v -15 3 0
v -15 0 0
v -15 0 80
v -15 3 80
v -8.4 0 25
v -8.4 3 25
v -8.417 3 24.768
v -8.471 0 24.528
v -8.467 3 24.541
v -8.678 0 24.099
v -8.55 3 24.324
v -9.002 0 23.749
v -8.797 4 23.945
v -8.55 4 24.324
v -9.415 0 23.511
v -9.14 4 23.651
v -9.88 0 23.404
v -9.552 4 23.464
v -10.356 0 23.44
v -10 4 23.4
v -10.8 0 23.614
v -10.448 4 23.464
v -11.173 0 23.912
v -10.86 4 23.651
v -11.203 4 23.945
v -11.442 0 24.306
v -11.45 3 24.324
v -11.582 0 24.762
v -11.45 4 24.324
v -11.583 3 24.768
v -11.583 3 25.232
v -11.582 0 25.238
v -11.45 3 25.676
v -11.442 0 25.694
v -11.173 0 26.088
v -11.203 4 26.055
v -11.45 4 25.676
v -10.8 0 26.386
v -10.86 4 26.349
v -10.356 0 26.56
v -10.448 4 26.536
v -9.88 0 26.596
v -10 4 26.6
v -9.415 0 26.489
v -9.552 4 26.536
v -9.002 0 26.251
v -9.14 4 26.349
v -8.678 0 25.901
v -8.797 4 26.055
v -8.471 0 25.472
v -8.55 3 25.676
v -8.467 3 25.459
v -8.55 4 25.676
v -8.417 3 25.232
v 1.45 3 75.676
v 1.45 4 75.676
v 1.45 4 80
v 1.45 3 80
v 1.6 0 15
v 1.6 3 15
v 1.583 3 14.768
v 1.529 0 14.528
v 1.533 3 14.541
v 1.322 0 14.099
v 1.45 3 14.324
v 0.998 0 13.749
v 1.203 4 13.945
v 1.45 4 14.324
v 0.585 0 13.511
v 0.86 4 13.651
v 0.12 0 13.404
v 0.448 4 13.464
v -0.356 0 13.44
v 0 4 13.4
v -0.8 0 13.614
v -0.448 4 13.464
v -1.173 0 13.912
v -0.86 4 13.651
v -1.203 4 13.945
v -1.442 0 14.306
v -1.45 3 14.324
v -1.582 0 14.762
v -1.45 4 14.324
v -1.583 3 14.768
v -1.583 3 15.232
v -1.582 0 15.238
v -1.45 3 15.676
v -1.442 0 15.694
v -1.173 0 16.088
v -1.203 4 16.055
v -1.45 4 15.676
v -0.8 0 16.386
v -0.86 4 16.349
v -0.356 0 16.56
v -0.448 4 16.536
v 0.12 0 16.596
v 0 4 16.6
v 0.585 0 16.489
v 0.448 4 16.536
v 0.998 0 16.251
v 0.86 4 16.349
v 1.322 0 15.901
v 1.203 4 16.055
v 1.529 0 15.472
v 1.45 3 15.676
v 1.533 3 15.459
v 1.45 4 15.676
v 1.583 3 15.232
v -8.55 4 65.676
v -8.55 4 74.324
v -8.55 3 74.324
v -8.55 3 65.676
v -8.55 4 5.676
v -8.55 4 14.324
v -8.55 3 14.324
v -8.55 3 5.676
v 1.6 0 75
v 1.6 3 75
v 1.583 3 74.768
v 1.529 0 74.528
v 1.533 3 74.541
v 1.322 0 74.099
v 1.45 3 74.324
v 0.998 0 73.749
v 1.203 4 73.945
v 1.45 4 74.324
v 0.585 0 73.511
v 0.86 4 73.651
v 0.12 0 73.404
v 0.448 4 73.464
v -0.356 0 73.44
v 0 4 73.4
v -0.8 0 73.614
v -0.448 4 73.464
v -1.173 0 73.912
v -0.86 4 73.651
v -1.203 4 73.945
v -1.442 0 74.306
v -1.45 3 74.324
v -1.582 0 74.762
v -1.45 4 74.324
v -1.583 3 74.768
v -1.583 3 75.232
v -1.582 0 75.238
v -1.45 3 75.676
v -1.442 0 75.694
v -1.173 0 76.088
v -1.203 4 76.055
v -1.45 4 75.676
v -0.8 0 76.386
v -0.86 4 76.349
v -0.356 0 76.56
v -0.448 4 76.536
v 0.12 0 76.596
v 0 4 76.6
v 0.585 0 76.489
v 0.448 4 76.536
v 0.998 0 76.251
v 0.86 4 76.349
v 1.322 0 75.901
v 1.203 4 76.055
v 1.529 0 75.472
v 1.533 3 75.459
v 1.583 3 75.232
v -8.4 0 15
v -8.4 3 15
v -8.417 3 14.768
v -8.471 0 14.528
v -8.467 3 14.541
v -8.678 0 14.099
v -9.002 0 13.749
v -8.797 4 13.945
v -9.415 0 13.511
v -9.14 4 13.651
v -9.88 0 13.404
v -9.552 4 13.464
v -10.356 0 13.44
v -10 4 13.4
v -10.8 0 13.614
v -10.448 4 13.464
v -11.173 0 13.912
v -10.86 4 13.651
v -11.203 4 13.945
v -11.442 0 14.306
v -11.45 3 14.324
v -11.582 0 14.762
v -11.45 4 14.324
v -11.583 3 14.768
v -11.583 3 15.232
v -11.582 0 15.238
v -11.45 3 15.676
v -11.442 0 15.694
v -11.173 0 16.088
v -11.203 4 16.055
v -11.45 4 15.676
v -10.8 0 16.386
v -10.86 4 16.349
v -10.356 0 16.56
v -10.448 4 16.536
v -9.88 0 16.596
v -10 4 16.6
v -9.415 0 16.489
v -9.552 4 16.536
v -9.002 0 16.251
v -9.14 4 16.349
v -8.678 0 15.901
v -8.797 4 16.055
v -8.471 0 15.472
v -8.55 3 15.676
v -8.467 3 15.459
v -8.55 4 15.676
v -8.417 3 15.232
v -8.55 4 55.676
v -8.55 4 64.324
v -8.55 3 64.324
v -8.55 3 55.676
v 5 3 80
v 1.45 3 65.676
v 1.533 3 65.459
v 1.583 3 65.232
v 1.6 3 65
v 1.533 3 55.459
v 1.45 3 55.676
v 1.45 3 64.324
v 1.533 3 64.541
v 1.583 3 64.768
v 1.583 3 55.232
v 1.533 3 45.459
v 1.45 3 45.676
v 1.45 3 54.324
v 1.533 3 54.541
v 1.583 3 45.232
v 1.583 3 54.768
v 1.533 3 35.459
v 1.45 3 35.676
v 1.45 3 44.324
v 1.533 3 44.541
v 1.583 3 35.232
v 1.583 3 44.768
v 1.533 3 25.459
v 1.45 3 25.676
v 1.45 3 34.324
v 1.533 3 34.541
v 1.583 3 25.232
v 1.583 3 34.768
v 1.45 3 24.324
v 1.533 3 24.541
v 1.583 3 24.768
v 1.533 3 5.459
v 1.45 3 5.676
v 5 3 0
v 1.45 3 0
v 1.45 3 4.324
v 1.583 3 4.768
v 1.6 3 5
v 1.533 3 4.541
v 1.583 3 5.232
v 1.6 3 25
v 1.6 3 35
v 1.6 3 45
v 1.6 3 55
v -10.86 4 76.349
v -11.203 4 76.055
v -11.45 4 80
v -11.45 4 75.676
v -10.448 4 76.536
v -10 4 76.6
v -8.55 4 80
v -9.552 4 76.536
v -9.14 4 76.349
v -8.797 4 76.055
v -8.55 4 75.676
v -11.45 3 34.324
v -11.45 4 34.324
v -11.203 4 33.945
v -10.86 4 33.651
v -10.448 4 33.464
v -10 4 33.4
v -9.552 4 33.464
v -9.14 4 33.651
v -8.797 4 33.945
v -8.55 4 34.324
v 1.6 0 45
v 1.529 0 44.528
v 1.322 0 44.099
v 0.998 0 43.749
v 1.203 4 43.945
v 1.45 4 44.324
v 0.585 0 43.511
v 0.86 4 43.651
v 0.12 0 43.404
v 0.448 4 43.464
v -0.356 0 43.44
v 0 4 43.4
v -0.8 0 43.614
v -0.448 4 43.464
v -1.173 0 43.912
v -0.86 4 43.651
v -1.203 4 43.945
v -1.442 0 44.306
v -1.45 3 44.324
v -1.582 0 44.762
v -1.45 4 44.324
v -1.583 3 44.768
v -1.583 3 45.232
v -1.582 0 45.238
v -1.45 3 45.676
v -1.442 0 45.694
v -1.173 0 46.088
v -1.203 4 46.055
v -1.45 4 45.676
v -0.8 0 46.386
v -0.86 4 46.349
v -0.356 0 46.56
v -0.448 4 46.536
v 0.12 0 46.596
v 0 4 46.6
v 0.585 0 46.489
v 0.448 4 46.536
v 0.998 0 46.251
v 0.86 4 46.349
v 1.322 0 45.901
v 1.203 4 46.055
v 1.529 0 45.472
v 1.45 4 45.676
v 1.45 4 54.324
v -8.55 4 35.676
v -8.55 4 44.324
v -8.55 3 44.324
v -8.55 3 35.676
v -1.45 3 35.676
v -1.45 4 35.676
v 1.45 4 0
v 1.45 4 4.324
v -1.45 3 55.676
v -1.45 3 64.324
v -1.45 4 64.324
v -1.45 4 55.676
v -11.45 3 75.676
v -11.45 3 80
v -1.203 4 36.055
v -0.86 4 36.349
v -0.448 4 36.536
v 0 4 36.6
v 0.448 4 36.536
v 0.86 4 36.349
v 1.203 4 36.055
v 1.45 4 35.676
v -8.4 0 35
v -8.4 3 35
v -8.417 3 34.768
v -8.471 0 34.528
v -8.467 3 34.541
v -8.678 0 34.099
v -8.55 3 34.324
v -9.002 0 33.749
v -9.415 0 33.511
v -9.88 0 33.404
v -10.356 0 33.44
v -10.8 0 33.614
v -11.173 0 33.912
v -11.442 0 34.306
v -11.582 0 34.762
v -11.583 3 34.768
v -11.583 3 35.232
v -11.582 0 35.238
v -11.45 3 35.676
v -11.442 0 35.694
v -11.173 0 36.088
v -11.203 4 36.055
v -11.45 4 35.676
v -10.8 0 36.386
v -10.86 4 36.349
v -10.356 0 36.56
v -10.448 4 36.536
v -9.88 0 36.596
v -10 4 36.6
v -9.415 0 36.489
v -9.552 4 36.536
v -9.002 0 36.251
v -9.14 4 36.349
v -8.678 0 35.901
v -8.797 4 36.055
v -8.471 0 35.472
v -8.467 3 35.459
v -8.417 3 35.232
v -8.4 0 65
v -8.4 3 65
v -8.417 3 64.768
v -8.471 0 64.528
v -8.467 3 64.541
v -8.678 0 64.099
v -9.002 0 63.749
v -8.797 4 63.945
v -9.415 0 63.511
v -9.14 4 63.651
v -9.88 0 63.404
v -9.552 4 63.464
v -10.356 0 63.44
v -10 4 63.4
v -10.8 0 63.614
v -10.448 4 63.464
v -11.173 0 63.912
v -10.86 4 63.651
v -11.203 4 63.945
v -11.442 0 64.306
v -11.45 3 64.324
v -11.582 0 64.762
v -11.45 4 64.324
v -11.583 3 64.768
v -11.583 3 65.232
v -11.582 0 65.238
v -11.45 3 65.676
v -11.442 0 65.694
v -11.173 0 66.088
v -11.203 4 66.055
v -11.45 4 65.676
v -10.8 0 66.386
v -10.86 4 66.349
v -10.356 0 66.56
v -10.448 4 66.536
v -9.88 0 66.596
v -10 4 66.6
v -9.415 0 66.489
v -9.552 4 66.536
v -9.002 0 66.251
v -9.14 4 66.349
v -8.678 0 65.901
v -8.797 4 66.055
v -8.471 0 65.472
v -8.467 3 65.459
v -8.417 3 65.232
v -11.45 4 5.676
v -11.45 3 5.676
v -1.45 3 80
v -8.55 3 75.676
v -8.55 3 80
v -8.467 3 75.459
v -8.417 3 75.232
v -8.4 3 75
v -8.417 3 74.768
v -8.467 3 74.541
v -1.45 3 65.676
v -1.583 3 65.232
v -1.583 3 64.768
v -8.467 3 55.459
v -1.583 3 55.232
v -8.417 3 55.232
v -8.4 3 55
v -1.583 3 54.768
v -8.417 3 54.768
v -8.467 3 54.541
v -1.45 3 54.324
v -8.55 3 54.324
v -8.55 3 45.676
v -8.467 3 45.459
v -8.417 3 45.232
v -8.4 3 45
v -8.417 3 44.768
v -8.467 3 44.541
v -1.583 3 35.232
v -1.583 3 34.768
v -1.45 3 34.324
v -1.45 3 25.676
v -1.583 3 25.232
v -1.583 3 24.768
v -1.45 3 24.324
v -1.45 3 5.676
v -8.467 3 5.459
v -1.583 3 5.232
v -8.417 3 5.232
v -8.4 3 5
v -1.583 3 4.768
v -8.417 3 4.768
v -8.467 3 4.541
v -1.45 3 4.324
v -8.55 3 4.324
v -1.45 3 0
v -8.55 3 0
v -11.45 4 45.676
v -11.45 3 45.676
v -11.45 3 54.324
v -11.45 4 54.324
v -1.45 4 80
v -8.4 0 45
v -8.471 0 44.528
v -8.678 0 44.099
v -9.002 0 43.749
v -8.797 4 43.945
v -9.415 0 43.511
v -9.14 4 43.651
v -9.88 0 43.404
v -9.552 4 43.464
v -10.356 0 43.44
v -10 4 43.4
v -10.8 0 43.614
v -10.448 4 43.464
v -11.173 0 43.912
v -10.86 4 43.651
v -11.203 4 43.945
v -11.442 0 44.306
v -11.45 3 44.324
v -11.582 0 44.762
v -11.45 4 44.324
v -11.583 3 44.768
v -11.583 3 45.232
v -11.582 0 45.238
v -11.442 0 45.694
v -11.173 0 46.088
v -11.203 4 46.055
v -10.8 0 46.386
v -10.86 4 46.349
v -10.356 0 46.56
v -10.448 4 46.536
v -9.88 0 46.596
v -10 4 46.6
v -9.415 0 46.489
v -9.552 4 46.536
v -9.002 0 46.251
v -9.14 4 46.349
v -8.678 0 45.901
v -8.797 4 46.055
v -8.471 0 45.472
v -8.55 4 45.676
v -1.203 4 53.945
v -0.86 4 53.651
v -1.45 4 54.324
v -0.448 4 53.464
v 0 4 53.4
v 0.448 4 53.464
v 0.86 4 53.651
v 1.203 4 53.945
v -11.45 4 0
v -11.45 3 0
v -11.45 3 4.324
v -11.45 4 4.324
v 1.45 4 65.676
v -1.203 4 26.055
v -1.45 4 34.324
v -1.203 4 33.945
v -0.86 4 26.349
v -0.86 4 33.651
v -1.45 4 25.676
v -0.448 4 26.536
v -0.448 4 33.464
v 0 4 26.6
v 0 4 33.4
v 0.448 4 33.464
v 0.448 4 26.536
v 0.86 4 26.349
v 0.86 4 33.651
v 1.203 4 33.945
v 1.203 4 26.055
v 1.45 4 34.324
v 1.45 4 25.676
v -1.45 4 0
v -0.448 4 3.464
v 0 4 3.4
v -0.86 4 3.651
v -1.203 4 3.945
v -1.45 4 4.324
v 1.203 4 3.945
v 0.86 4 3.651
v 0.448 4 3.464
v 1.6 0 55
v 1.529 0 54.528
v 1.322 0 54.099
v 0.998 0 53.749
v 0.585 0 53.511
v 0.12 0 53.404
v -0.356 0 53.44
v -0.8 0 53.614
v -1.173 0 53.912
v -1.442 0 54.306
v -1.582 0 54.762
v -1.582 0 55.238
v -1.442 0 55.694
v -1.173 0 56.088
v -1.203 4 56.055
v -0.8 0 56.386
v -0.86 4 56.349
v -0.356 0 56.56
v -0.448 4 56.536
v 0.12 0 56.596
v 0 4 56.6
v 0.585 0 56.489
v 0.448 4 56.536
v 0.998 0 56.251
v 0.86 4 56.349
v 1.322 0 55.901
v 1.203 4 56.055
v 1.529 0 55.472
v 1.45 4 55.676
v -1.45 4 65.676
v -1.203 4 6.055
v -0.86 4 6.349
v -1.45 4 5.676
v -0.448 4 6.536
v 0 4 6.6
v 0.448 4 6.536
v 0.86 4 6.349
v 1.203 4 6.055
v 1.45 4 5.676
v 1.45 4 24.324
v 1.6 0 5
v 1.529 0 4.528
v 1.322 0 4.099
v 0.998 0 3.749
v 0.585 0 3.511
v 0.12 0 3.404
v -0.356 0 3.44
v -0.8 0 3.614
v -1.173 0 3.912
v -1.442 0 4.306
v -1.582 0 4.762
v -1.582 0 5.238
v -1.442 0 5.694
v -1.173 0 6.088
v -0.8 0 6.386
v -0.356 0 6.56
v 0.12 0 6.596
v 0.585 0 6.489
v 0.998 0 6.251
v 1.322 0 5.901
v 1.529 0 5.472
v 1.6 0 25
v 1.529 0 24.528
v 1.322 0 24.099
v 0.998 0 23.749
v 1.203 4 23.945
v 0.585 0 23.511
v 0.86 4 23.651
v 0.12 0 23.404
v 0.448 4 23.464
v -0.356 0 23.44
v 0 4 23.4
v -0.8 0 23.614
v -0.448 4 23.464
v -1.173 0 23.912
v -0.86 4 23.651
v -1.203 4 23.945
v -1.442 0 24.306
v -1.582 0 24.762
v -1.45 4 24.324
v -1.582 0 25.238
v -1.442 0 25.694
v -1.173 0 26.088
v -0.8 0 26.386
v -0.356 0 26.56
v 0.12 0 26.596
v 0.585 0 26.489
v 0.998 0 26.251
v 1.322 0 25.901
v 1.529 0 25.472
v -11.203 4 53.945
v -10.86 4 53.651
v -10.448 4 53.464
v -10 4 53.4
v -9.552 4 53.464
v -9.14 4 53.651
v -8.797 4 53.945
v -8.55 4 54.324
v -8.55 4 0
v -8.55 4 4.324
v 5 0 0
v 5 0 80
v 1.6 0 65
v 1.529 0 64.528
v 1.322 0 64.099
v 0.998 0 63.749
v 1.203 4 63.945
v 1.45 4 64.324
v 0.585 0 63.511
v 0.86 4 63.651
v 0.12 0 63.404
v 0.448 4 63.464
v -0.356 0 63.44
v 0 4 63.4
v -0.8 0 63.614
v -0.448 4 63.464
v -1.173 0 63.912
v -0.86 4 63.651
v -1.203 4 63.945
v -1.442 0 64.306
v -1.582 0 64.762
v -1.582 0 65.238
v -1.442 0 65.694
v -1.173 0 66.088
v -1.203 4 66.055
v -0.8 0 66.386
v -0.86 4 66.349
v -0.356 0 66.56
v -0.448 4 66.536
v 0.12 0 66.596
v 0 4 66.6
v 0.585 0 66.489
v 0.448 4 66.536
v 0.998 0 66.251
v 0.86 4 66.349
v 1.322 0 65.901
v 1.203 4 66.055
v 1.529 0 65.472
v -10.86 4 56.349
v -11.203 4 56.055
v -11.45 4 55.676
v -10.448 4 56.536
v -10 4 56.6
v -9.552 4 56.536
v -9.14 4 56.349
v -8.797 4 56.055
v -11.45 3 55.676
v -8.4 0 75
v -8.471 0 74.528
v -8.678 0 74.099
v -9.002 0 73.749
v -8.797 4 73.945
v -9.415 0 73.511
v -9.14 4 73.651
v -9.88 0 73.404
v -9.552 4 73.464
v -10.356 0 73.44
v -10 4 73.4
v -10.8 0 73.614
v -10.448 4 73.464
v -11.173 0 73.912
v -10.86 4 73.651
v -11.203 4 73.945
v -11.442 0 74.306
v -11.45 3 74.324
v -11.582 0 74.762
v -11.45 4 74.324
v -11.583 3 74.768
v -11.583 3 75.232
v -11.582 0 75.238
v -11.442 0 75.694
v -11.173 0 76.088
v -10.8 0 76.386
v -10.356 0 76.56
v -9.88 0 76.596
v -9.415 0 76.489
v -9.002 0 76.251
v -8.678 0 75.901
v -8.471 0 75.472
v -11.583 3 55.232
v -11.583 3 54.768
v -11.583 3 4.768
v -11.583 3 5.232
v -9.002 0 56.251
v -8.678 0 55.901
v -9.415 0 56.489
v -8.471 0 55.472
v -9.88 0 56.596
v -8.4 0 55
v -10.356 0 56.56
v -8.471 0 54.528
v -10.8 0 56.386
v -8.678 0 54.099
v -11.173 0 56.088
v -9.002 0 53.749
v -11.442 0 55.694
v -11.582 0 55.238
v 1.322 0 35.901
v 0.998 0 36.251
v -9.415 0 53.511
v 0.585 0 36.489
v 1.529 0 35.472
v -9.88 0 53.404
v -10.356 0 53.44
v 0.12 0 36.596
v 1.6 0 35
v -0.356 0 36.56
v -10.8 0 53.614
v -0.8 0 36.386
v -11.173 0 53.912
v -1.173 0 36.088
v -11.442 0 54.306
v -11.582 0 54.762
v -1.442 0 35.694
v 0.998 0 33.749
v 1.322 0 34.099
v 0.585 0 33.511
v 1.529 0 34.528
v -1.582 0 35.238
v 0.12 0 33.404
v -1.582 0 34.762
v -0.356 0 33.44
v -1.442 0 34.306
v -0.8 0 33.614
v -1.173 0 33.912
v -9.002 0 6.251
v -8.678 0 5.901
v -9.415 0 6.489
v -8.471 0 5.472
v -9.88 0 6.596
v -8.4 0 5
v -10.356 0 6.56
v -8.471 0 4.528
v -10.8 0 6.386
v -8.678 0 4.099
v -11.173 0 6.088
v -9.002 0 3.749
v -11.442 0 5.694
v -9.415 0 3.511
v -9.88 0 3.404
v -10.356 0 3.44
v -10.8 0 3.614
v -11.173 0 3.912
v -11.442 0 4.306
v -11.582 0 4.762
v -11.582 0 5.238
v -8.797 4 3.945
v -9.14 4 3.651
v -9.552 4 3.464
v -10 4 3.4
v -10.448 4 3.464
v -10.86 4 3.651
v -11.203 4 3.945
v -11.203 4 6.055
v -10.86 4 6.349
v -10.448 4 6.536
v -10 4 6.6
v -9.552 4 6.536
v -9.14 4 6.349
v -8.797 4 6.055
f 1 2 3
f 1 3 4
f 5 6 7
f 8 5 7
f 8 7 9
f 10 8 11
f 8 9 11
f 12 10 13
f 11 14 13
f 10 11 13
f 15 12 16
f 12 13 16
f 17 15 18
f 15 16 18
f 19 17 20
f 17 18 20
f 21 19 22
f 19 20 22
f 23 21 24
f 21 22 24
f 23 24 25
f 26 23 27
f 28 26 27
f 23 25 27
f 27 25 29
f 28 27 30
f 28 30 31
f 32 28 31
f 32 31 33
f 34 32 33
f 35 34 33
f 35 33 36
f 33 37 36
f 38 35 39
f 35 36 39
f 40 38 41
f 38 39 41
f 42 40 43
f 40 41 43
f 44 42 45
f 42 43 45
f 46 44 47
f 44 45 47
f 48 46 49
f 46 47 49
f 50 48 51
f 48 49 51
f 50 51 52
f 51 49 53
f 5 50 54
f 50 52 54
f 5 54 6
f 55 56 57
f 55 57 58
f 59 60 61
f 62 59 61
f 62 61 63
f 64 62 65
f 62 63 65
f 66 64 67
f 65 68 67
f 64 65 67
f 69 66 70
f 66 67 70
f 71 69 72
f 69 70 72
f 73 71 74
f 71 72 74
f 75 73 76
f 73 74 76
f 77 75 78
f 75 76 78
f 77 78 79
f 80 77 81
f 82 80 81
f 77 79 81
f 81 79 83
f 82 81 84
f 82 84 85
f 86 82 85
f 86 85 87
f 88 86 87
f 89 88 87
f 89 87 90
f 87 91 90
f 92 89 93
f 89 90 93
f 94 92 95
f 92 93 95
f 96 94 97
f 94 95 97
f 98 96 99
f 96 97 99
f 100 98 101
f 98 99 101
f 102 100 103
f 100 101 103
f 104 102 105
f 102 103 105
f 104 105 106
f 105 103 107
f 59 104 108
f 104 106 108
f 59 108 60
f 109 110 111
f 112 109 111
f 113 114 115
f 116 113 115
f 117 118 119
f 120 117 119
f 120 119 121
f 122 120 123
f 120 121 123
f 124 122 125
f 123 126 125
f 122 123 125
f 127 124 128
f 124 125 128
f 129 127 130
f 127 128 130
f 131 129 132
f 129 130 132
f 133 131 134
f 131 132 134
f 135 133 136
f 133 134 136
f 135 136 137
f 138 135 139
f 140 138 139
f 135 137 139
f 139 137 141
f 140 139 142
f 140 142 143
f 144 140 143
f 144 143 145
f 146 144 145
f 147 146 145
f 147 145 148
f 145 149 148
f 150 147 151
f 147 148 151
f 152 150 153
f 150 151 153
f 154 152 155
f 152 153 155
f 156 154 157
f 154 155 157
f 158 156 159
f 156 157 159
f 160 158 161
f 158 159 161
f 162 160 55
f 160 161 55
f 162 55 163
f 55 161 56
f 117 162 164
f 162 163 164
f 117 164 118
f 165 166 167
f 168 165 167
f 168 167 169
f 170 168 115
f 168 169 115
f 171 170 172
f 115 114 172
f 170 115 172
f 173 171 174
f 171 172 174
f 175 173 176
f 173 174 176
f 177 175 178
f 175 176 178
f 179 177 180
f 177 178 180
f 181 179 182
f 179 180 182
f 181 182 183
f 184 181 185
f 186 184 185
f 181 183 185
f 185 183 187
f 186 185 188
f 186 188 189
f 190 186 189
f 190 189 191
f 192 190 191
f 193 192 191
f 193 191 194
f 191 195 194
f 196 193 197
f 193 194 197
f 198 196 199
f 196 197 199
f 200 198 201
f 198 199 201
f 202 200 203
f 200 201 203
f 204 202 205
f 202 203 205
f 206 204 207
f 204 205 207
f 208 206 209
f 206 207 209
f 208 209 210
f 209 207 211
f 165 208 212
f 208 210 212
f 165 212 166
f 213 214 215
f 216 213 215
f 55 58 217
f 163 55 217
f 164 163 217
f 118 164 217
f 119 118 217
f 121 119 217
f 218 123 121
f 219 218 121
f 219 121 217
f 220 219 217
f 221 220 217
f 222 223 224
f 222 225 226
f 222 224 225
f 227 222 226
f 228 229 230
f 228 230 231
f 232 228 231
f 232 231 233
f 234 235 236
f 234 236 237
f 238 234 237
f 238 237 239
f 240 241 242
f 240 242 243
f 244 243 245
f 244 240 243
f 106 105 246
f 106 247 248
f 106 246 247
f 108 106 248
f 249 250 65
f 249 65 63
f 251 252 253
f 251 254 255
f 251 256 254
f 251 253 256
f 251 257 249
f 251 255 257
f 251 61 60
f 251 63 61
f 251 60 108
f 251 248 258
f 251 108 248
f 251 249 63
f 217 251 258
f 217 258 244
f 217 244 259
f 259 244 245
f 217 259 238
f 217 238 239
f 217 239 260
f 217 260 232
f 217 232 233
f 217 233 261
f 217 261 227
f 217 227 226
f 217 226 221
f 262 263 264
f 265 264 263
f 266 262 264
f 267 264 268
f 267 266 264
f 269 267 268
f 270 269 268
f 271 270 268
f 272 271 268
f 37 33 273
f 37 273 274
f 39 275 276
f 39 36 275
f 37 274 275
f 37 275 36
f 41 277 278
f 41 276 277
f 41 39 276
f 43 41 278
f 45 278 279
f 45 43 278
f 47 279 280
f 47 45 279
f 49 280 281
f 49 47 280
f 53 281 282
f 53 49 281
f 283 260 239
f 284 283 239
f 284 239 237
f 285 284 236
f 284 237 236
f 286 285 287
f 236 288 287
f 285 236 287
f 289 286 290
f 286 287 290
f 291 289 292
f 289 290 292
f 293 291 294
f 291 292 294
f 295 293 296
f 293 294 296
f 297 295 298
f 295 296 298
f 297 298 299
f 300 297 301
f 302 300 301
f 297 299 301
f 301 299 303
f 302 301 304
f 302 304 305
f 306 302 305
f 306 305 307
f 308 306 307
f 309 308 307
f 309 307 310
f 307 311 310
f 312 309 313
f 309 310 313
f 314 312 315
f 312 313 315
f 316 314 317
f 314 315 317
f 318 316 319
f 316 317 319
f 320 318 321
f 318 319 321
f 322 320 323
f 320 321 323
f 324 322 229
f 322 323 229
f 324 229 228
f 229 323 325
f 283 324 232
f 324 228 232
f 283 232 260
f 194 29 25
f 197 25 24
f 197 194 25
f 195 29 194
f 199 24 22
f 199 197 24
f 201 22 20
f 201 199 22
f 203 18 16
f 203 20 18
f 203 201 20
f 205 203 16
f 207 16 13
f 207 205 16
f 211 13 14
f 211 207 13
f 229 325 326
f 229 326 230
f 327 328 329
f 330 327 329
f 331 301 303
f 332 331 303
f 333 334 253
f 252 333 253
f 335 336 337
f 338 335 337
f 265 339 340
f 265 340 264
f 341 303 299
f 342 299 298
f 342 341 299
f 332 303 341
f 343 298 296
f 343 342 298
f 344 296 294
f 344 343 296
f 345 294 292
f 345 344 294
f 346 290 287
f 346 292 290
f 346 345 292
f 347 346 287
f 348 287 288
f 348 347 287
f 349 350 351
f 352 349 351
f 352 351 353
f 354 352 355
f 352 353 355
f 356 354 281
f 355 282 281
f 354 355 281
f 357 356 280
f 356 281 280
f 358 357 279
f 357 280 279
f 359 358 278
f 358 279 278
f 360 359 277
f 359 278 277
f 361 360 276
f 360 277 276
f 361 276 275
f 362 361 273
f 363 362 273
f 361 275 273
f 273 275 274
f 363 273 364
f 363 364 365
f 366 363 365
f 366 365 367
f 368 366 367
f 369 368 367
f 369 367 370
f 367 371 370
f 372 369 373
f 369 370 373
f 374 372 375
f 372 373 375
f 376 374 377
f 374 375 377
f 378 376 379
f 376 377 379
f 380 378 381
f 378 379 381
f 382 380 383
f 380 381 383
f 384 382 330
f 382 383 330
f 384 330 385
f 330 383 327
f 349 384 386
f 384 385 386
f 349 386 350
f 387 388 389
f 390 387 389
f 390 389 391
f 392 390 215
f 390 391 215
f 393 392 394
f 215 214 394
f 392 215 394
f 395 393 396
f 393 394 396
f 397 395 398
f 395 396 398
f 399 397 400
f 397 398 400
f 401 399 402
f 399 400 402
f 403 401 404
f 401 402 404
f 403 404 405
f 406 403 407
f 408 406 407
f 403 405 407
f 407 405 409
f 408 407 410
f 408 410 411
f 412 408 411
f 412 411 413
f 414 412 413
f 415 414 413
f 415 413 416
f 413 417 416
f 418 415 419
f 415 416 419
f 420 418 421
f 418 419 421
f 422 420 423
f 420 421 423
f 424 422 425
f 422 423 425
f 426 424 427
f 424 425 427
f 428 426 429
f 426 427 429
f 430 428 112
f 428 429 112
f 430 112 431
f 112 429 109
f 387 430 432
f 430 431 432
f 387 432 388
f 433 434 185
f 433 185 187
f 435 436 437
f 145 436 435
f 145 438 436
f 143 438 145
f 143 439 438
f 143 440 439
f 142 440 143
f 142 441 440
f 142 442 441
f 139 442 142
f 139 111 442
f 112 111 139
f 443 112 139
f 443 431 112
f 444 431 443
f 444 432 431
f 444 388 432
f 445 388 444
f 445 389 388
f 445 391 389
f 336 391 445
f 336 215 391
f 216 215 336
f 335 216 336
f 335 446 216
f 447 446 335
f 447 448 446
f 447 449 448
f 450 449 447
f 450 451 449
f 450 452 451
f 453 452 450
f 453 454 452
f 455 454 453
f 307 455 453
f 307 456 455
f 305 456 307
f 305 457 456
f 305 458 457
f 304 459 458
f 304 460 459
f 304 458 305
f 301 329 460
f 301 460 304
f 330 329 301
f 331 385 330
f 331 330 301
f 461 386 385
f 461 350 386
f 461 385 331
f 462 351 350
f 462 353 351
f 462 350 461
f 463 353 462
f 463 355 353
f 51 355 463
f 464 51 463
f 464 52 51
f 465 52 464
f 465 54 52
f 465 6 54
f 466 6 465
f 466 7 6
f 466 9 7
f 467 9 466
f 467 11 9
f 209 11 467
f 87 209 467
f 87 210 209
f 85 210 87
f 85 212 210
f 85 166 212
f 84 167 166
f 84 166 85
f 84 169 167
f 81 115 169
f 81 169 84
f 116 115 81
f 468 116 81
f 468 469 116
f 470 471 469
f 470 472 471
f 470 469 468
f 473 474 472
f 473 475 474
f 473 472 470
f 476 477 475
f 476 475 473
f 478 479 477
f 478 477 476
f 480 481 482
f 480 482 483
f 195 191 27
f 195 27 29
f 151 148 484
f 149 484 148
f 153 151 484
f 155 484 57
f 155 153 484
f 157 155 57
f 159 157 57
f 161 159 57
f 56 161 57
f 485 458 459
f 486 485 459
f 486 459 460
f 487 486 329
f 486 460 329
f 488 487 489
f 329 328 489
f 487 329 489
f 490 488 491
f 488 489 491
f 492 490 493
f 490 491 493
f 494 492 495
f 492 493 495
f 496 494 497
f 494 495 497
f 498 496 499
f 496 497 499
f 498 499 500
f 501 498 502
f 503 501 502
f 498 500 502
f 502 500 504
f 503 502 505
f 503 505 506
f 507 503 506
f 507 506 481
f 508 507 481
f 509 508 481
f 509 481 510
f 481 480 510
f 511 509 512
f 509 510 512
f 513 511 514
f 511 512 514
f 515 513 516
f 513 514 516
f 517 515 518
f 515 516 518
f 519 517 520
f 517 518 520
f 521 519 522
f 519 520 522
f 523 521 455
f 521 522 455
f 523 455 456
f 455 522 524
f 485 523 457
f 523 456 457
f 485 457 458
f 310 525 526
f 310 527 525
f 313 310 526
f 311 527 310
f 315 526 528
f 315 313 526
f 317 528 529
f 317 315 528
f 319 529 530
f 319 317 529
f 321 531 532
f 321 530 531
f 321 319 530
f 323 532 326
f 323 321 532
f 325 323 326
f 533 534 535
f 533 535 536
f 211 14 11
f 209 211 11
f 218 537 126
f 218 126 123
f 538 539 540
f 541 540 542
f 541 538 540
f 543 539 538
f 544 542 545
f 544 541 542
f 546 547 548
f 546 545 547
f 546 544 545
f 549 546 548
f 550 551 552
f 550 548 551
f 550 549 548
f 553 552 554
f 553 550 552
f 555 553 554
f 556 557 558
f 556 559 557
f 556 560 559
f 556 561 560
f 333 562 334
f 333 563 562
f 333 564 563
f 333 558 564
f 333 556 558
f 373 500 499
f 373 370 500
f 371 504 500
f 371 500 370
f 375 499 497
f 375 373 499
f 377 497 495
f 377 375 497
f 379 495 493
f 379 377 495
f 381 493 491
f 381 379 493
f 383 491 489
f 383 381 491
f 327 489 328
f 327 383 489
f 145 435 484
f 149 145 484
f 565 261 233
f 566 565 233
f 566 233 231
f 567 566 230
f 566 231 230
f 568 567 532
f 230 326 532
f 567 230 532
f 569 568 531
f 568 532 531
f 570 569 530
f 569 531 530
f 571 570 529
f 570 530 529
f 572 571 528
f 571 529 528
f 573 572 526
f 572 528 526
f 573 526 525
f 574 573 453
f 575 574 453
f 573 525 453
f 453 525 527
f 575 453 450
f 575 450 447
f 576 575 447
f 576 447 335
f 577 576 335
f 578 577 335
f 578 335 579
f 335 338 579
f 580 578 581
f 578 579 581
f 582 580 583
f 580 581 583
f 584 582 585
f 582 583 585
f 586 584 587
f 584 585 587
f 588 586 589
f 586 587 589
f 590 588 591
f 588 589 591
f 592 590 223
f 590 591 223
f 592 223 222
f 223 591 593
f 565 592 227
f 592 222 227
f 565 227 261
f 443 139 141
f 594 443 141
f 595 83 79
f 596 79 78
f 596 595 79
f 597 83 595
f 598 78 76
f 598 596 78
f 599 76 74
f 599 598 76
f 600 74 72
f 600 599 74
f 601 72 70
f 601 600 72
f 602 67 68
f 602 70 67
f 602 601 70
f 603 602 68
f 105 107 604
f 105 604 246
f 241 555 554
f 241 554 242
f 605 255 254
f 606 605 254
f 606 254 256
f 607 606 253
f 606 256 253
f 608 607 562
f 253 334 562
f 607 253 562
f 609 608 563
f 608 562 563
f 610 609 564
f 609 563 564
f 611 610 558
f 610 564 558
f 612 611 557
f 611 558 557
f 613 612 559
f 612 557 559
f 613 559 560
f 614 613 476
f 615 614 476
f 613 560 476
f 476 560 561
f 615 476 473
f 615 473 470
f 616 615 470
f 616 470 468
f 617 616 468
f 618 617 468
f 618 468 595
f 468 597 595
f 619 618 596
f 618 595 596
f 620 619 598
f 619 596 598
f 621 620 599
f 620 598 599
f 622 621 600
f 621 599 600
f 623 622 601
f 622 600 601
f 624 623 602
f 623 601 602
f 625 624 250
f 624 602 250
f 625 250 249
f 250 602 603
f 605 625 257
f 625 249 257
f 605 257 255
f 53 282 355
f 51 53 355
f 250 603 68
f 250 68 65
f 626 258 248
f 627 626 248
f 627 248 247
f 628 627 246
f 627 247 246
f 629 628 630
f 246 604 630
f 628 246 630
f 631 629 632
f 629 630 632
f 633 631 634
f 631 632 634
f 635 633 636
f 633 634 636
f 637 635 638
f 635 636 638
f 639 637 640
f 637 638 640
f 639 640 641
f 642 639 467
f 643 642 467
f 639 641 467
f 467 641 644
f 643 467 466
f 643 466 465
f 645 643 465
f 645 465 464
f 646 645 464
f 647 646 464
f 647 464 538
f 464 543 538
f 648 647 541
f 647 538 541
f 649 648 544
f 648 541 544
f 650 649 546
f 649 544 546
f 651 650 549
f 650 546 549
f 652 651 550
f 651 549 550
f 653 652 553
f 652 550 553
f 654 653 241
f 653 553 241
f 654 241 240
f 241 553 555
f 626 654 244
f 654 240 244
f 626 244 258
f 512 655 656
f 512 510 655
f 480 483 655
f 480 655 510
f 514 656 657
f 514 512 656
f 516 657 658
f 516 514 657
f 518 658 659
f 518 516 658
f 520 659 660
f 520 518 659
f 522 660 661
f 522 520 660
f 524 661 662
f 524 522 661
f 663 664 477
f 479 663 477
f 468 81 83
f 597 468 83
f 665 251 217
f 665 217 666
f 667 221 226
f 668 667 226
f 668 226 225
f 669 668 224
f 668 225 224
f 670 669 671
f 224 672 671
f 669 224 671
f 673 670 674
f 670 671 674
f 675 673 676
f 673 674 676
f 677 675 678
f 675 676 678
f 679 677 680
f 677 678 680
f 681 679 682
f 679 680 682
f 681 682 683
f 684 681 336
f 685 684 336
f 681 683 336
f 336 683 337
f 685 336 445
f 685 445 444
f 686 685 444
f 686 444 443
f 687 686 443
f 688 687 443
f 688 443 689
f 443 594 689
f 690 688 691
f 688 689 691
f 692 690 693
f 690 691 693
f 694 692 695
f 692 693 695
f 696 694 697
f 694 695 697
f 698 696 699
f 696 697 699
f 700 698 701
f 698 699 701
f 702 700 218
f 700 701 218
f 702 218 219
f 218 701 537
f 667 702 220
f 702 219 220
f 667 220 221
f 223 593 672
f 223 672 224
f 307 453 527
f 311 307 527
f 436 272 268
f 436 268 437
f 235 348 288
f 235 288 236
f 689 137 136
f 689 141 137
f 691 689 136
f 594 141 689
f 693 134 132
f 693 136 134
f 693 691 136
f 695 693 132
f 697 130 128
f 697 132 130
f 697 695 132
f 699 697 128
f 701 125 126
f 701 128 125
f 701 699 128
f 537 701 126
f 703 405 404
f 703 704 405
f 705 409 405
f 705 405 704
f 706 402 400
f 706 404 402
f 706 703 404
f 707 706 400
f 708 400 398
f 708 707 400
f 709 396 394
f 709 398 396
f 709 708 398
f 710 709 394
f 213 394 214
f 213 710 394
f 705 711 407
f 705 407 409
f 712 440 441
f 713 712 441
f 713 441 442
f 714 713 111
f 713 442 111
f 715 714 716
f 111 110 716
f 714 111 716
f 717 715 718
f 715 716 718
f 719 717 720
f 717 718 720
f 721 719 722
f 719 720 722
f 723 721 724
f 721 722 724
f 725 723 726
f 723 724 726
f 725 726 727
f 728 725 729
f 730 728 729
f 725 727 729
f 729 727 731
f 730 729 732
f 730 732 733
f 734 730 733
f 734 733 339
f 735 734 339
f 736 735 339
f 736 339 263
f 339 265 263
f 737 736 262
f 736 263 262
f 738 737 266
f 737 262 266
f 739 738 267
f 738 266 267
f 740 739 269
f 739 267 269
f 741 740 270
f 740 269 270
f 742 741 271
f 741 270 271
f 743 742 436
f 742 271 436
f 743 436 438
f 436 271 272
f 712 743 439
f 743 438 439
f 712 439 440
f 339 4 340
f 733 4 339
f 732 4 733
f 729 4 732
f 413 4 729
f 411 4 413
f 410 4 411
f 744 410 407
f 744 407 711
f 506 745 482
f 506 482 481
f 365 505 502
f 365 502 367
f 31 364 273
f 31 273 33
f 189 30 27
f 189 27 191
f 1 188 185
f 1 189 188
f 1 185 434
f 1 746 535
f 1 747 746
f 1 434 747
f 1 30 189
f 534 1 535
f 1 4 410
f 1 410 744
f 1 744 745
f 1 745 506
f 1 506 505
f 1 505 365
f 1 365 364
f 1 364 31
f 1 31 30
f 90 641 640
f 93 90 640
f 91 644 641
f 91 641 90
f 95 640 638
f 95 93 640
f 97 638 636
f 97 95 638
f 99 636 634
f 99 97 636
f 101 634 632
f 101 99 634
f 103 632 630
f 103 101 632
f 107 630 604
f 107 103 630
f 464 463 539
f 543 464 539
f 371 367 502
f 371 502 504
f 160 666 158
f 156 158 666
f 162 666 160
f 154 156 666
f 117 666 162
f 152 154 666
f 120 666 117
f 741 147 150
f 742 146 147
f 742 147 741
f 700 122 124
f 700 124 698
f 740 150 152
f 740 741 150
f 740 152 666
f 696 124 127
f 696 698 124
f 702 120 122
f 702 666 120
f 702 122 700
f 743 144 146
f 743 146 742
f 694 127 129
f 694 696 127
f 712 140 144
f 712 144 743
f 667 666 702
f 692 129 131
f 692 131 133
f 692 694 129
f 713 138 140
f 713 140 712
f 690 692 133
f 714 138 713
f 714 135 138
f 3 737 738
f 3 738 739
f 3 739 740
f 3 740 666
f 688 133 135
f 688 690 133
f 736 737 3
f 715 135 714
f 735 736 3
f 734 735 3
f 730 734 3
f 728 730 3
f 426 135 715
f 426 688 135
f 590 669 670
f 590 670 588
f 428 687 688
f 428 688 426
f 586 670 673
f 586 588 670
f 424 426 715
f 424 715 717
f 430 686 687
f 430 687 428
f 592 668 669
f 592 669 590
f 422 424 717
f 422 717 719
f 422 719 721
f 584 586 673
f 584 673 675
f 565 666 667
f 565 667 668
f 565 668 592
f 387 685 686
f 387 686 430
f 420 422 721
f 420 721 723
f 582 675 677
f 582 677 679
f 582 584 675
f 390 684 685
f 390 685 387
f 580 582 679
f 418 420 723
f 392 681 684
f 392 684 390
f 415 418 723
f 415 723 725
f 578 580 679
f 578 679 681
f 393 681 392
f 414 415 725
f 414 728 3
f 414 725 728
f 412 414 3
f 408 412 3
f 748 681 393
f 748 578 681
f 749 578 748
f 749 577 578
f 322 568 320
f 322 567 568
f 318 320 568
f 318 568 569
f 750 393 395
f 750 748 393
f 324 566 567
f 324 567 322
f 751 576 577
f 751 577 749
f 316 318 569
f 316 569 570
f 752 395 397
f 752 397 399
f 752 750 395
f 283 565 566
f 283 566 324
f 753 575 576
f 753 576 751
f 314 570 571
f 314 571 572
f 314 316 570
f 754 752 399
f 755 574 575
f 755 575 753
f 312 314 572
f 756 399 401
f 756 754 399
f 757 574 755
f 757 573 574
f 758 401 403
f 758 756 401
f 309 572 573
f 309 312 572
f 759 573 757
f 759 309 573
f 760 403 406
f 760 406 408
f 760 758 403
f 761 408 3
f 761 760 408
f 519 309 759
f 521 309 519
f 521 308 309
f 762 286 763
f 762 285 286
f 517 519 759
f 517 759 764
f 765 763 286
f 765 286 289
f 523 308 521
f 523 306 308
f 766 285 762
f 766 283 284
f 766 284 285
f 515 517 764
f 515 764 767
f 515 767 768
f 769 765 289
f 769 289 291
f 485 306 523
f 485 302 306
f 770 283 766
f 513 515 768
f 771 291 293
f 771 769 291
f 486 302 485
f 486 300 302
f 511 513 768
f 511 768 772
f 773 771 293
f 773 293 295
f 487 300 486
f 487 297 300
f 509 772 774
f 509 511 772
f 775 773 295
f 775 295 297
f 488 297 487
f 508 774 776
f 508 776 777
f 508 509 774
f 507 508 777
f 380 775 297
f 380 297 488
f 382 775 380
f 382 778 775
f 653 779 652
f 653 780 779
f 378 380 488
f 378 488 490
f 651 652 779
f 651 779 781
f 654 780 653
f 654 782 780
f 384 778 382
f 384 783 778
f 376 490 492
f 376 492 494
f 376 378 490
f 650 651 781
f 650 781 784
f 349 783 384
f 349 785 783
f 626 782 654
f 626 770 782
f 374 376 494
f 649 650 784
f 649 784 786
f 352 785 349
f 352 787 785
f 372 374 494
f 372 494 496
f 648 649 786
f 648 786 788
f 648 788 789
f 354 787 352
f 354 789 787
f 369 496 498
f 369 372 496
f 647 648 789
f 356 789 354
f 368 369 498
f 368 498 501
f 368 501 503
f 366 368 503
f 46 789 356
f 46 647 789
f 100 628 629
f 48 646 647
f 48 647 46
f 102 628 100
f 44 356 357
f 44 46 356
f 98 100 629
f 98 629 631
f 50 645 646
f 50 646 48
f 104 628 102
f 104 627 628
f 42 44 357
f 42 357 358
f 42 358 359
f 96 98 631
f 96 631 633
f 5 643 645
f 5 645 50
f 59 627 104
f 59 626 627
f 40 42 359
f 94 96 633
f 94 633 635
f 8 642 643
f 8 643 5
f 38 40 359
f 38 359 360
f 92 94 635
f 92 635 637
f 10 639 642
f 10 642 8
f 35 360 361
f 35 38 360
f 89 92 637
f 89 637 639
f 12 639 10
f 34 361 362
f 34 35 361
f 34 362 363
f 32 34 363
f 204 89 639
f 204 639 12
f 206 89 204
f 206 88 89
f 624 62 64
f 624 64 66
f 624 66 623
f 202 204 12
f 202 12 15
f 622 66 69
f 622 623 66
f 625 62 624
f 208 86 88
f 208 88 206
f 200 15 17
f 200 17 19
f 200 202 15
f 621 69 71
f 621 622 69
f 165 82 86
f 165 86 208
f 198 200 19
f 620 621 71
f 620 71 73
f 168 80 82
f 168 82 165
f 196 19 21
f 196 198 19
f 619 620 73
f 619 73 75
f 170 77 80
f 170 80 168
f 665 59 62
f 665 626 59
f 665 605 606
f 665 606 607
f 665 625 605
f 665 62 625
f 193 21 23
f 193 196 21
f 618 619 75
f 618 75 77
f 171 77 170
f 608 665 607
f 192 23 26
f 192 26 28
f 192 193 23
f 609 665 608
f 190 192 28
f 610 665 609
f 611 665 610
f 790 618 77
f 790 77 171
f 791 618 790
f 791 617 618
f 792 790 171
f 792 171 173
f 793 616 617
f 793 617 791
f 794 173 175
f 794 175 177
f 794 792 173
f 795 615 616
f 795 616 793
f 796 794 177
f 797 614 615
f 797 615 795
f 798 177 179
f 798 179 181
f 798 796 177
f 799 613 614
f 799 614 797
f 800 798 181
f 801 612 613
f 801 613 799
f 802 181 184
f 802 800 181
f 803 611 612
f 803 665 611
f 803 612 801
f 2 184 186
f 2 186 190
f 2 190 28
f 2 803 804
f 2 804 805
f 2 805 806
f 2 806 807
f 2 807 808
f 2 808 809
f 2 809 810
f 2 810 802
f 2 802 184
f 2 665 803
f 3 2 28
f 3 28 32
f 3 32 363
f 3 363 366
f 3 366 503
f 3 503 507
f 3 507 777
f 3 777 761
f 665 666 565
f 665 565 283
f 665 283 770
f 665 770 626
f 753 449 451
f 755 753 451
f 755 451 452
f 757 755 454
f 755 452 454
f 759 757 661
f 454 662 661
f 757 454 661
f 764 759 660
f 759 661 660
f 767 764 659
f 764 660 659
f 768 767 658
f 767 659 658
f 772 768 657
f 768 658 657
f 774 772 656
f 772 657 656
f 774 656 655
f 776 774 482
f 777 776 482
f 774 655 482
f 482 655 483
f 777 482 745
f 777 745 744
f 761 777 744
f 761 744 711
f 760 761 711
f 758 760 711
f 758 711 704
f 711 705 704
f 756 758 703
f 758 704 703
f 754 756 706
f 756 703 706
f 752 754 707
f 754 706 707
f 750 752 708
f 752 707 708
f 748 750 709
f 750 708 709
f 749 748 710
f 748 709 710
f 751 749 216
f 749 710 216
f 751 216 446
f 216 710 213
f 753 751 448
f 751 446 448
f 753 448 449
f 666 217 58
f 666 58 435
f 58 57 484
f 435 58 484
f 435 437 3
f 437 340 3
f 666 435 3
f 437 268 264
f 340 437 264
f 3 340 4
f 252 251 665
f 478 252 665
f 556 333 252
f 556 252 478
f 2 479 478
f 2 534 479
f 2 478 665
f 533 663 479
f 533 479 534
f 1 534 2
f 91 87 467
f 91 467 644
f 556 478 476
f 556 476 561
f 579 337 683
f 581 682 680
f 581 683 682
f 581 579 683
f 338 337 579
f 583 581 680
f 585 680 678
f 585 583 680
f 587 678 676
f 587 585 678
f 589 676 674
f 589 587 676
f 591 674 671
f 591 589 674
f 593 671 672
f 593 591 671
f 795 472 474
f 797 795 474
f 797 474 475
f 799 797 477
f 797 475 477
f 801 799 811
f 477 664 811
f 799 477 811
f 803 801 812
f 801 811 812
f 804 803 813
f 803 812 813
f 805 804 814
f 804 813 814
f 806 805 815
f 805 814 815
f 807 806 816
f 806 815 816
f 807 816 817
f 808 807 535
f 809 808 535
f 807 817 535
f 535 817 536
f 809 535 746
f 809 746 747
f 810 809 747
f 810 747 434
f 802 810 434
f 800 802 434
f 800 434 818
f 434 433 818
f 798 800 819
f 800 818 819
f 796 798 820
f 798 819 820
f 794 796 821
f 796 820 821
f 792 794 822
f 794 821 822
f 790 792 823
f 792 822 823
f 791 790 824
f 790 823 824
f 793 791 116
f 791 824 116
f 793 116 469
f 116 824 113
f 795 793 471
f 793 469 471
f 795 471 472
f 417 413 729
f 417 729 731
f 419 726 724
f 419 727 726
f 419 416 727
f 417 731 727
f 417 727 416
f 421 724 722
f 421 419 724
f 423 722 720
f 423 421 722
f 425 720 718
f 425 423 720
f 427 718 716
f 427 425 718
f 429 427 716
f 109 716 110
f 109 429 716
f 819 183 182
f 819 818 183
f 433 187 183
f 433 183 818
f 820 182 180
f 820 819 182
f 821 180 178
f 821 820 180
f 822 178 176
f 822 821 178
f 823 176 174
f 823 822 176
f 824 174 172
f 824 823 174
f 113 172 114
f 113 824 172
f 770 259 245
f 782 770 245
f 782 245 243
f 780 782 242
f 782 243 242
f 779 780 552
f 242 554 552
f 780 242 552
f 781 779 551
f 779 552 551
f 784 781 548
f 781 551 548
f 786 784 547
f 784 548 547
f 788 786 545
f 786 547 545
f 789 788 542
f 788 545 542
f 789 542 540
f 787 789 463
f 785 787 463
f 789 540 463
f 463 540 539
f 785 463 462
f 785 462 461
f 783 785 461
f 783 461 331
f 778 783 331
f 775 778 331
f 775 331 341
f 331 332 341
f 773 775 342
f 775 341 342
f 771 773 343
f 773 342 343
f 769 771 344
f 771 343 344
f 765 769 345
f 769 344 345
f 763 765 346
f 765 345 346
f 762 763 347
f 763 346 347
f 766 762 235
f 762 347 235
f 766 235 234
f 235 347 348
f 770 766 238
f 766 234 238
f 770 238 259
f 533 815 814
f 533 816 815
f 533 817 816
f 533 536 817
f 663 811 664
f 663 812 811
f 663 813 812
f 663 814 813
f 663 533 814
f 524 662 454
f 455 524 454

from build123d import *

# Parameters (mm, degrees)
MAIN_DEPTH                      = 20
ESQUISSE2_R                     = 1.6
TOPHOLE_DEPTH                   = 5
R_P_TITION_LIN_AIRE1_COUNT      = 4
R_P_TITION_LIN_AIRE1_PITCH      = 20
R_P_TITION_LIN_AIRE1_COUNT_DIR2 = 2
R_P_TITION_LIN_AIRE1_PITCH_DIR2 = 10


with BuildPart() as part:
    # Esquisse1 → Main (new body)
    with BuildSketch(Plane.XY):
        Polygon((-5, 0), (-5, 3), (-1.45, 3), (-1.45, 4), (1.45, 4), (1.45, 3), (5, 3), (5, 0), align=None)
    main = extrude(amount=MAIN_DEPTH)

    # Esquisse2 → TopHole (cut, through all)
    with BuildSketch(Plane(origin=(0, 4, 0), x_dir=(1, 0, 0), z_dir=(0, 1, 0))):
        with Locations((0, -5)):
            Circle(ESQUISSE2_R)
        with Locations((0, -15)):
            Circle(ESQUISSE2_R)
    tophole = extrude(amount=-TOPHOLE_DEPTH, mode=Mode.SUBTRACT)

    # Répétition linéaire1: Main, TopHole 4 × 2
    with Locations(*[(-j * R_P_TITION_LIN_AIRE1_PITCH_DIR2, 0, i * R_P_TITION_LIN_AIRE1_PITCH) for i in range(R_P_TITION_LIN_AIRE1_COUNT) for j in range(R_P_TITION_LIN_AIRE1_COUNT_DIR2) if (i, j) != (0, 0)]):
        add(main)
        add(tophole, mode=Mode.SUBTRACT)


solid = part.part
